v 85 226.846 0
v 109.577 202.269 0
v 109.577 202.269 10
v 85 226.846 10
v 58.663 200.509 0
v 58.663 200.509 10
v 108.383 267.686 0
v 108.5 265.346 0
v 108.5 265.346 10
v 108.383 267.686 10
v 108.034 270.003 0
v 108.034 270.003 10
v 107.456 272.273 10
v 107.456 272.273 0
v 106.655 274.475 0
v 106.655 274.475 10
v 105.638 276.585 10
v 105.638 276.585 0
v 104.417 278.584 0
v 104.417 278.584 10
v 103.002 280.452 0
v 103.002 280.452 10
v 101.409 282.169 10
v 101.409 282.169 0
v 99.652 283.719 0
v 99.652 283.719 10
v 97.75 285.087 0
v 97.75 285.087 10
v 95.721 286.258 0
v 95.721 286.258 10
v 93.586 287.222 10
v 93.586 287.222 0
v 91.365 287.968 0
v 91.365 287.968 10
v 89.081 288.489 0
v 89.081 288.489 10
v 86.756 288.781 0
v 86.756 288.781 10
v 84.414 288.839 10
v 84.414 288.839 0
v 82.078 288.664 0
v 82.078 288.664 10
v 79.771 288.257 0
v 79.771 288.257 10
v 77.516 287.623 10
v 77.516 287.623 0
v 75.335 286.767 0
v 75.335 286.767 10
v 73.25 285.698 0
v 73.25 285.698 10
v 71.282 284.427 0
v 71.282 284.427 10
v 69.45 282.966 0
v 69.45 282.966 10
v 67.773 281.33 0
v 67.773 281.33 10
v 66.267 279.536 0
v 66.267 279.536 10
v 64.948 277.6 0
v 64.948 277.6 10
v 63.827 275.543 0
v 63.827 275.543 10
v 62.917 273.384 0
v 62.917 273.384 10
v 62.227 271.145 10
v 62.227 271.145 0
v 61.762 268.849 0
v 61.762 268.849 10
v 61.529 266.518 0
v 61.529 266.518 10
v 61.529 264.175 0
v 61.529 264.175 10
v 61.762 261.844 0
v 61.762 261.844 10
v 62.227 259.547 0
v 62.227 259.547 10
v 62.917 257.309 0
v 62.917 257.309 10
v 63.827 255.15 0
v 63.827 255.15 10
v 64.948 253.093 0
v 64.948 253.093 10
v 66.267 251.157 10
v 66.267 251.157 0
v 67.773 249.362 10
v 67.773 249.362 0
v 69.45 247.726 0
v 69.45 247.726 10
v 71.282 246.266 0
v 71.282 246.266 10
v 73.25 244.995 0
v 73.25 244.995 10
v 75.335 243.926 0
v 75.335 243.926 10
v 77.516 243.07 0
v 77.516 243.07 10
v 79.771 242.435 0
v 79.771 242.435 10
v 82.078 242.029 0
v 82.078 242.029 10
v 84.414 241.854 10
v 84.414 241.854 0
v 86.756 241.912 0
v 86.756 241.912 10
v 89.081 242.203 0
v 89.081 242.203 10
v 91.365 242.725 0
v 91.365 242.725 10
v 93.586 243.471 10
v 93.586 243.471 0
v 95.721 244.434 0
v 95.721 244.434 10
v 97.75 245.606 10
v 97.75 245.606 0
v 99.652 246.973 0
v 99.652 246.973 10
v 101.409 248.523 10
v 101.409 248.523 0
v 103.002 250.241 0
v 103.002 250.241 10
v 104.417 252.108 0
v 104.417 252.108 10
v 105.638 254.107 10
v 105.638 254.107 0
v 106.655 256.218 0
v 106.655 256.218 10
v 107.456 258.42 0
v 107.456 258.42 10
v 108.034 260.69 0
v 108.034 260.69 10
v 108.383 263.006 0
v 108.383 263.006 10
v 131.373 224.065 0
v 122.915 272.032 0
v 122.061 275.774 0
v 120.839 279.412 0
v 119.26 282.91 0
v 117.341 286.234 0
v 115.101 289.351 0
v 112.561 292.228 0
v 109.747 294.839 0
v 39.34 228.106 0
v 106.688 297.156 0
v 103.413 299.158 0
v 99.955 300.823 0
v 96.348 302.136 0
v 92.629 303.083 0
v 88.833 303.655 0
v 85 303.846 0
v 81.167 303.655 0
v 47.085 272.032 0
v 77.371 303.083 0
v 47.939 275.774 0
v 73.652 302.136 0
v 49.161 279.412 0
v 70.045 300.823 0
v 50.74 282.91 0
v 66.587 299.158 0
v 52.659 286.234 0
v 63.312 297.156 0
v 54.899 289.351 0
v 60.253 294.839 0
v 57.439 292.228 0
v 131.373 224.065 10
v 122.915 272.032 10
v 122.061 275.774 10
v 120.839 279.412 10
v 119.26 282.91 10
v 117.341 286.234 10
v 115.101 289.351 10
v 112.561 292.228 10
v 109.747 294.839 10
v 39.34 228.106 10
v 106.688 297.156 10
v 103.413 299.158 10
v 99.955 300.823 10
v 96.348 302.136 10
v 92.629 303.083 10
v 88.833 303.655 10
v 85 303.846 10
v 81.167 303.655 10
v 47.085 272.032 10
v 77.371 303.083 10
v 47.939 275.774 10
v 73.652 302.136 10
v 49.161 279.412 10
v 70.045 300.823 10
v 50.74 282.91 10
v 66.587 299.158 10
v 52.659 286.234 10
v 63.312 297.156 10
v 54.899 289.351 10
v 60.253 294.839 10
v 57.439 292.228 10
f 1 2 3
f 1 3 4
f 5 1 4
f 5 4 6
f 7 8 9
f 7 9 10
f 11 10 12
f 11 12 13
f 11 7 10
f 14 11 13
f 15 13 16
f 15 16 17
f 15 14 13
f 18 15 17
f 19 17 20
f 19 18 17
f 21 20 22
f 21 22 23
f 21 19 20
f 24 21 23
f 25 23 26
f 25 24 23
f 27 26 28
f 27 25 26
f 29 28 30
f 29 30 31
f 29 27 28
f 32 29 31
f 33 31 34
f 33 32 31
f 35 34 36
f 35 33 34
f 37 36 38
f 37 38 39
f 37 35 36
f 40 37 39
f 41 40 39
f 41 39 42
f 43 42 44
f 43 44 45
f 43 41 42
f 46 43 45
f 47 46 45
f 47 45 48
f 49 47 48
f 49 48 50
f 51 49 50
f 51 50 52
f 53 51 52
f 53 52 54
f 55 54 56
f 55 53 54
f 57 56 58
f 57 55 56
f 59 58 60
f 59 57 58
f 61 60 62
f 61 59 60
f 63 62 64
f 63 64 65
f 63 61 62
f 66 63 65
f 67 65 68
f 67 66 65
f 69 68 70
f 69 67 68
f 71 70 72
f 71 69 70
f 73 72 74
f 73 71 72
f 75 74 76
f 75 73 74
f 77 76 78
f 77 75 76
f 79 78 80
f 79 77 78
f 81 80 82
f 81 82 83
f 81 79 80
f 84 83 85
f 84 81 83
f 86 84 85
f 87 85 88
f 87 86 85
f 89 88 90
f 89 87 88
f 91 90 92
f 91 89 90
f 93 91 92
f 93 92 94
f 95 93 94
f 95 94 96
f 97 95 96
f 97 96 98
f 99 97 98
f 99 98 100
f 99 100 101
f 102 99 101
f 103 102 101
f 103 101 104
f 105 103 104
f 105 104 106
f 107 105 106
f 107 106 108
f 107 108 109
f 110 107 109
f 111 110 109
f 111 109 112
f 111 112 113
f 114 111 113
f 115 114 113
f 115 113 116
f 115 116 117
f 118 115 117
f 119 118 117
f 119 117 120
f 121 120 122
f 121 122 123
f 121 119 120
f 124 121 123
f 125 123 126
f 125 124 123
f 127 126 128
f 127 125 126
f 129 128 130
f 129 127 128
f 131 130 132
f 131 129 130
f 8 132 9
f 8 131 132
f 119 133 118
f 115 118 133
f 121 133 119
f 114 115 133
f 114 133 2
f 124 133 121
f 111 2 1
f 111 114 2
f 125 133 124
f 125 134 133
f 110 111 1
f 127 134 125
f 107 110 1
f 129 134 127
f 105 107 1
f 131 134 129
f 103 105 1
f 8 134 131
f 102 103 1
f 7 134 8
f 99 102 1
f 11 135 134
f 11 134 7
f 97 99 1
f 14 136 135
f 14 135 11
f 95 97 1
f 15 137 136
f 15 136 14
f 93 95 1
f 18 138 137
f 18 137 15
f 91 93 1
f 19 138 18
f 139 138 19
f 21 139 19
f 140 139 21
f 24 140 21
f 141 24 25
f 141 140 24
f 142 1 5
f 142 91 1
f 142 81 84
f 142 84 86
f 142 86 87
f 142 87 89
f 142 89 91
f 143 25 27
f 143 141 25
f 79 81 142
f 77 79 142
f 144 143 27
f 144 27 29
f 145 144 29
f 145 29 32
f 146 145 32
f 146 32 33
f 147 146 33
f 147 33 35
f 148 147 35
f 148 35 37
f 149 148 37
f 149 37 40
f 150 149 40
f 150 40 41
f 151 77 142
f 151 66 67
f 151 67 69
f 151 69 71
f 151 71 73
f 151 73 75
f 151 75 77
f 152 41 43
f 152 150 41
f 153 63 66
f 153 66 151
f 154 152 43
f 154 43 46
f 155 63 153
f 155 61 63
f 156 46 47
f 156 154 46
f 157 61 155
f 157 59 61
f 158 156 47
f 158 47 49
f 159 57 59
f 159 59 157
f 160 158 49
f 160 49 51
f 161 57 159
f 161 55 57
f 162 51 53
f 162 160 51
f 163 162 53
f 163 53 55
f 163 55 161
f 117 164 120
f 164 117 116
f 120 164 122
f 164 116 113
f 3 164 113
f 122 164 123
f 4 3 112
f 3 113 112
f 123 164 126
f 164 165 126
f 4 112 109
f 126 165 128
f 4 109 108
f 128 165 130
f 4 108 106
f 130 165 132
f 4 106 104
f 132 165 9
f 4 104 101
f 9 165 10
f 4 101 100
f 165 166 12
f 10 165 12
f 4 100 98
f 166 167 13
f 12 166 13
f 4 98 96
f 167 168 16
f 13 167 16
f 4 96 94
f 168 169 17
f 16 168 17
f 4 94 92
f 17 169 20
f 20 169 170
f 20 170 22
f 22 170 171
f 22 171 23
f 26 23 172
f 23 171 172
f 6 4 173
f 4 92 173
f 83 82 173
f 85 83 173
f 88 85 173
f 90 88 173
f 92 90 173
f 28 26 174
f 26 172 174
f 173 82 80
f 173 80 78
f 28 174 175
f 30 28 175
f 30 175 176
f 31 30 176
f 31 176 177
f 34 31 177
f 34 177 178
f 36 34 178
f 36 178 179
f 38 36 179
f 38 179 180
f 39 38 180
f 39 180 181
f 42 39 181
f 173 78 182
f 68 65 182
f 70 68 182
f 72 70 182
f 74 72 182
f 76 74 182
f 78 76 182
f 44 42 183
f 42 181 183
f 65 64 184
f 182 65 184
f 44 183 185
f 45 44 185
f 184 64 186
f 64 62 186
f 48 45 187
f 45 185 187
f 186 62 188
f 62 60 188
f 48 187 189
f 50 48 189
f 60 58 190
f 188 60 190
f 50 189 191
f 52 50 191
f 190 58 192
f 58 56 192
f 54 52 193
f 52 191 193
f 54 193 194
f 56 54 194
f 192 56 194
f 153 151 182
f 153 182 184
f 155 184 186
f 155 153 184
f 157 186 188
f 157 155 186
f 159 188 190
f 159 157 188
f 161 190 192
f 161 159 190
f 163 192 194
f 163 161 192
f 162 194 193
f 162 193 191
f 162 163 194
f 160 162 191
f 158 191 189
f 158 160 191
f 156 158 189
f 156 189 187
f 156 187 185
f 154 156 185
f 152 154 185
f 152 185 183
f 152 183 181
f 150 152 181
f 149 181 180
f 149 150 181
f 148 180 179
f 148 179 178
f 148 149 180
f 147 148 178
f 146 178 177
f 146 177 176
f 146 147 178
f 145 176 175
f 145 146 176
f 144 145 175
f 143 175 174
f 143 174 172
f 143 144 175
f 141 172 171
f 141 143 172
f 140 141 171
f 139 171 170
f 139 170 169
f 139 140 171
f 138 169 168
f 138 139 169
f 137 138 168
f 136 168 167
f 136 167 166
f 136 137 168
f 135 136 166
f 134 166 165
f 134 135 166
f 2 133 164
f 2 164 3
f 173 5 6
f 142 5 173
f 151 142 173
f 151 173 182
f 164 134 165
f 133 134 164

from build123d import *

# Parameters (mm, degrees)
ESQUISSE1_R        = 23.5
BOSS_EXTRU_1_DEPTH = 10
CHANFREIN1_SIZE    = 25.8965397
CHANFREIN1_SIZE_2  = 30


with BuildPart() as part:
    # Esquisse1 → Boss.-Extru.1 (new body)
    with BuildSketch(Plane.XY):
        with BuildLine():
            Line((85, 226.846291066), (56.715728753, 198.562019819))
            Line((56.715728753, 198.562019819), (34.130206535, 198.562019819))
            Line((34.130206535, 198.562019819), (47.084901509, 272.031745907))
            ThreePointArc((47.084901509, 272.031745907), (85, 303.846291066), (122.915098491, 272.031745907))
            Line((122.915098491, 272.031745907), (135.869793465, 198.562019819))
            Line((135.869793465, 198.562019819), (113.284271247, 198.562019819))
            Line((113.284271247, 198.562019819), (85, 226.846291066))
        make_face()
        with Locations((85, 265.346291066)):
            Circle(ESQUISSE1_R, mode=Mode.SUBTRACT)
    extrude(amount=BOSS_EXTRU_1_DEPTH)

    # Chanfrein1
    # the kernel refuses this chamfer: 30, 25.8965397 mm, written as the material it takes off along each edge
    with BuildSketch(Plane(origin=(34.130206535, 198.562019819, -77.150489639), x_dir=(0.9993171132668053, -0.036950062680586405, 0), z_dir=(0, 0, 1)), Plane(origin=(135.869793465, 198.562019819, -77.150489639), x_dir=(-0.13714088742803301, 0.9905515519120909, 0), z_dir=(0, 0, 1))) as chanfrein1_piece_1:
        Polygon((CHANFREIN1_SIZE * 0.999317113282, CHANFREIN1_SIZE * 0.0369500626812), (CHANFREIN1_SIZE_2 * 0.137140887428, CHANFREIN1_SIZE_2 * 0.990551551912), (0, 0), align=None)
    extrude(amount=164.300979278, mode=Mode.SUBTRACT)


solid = part.part
